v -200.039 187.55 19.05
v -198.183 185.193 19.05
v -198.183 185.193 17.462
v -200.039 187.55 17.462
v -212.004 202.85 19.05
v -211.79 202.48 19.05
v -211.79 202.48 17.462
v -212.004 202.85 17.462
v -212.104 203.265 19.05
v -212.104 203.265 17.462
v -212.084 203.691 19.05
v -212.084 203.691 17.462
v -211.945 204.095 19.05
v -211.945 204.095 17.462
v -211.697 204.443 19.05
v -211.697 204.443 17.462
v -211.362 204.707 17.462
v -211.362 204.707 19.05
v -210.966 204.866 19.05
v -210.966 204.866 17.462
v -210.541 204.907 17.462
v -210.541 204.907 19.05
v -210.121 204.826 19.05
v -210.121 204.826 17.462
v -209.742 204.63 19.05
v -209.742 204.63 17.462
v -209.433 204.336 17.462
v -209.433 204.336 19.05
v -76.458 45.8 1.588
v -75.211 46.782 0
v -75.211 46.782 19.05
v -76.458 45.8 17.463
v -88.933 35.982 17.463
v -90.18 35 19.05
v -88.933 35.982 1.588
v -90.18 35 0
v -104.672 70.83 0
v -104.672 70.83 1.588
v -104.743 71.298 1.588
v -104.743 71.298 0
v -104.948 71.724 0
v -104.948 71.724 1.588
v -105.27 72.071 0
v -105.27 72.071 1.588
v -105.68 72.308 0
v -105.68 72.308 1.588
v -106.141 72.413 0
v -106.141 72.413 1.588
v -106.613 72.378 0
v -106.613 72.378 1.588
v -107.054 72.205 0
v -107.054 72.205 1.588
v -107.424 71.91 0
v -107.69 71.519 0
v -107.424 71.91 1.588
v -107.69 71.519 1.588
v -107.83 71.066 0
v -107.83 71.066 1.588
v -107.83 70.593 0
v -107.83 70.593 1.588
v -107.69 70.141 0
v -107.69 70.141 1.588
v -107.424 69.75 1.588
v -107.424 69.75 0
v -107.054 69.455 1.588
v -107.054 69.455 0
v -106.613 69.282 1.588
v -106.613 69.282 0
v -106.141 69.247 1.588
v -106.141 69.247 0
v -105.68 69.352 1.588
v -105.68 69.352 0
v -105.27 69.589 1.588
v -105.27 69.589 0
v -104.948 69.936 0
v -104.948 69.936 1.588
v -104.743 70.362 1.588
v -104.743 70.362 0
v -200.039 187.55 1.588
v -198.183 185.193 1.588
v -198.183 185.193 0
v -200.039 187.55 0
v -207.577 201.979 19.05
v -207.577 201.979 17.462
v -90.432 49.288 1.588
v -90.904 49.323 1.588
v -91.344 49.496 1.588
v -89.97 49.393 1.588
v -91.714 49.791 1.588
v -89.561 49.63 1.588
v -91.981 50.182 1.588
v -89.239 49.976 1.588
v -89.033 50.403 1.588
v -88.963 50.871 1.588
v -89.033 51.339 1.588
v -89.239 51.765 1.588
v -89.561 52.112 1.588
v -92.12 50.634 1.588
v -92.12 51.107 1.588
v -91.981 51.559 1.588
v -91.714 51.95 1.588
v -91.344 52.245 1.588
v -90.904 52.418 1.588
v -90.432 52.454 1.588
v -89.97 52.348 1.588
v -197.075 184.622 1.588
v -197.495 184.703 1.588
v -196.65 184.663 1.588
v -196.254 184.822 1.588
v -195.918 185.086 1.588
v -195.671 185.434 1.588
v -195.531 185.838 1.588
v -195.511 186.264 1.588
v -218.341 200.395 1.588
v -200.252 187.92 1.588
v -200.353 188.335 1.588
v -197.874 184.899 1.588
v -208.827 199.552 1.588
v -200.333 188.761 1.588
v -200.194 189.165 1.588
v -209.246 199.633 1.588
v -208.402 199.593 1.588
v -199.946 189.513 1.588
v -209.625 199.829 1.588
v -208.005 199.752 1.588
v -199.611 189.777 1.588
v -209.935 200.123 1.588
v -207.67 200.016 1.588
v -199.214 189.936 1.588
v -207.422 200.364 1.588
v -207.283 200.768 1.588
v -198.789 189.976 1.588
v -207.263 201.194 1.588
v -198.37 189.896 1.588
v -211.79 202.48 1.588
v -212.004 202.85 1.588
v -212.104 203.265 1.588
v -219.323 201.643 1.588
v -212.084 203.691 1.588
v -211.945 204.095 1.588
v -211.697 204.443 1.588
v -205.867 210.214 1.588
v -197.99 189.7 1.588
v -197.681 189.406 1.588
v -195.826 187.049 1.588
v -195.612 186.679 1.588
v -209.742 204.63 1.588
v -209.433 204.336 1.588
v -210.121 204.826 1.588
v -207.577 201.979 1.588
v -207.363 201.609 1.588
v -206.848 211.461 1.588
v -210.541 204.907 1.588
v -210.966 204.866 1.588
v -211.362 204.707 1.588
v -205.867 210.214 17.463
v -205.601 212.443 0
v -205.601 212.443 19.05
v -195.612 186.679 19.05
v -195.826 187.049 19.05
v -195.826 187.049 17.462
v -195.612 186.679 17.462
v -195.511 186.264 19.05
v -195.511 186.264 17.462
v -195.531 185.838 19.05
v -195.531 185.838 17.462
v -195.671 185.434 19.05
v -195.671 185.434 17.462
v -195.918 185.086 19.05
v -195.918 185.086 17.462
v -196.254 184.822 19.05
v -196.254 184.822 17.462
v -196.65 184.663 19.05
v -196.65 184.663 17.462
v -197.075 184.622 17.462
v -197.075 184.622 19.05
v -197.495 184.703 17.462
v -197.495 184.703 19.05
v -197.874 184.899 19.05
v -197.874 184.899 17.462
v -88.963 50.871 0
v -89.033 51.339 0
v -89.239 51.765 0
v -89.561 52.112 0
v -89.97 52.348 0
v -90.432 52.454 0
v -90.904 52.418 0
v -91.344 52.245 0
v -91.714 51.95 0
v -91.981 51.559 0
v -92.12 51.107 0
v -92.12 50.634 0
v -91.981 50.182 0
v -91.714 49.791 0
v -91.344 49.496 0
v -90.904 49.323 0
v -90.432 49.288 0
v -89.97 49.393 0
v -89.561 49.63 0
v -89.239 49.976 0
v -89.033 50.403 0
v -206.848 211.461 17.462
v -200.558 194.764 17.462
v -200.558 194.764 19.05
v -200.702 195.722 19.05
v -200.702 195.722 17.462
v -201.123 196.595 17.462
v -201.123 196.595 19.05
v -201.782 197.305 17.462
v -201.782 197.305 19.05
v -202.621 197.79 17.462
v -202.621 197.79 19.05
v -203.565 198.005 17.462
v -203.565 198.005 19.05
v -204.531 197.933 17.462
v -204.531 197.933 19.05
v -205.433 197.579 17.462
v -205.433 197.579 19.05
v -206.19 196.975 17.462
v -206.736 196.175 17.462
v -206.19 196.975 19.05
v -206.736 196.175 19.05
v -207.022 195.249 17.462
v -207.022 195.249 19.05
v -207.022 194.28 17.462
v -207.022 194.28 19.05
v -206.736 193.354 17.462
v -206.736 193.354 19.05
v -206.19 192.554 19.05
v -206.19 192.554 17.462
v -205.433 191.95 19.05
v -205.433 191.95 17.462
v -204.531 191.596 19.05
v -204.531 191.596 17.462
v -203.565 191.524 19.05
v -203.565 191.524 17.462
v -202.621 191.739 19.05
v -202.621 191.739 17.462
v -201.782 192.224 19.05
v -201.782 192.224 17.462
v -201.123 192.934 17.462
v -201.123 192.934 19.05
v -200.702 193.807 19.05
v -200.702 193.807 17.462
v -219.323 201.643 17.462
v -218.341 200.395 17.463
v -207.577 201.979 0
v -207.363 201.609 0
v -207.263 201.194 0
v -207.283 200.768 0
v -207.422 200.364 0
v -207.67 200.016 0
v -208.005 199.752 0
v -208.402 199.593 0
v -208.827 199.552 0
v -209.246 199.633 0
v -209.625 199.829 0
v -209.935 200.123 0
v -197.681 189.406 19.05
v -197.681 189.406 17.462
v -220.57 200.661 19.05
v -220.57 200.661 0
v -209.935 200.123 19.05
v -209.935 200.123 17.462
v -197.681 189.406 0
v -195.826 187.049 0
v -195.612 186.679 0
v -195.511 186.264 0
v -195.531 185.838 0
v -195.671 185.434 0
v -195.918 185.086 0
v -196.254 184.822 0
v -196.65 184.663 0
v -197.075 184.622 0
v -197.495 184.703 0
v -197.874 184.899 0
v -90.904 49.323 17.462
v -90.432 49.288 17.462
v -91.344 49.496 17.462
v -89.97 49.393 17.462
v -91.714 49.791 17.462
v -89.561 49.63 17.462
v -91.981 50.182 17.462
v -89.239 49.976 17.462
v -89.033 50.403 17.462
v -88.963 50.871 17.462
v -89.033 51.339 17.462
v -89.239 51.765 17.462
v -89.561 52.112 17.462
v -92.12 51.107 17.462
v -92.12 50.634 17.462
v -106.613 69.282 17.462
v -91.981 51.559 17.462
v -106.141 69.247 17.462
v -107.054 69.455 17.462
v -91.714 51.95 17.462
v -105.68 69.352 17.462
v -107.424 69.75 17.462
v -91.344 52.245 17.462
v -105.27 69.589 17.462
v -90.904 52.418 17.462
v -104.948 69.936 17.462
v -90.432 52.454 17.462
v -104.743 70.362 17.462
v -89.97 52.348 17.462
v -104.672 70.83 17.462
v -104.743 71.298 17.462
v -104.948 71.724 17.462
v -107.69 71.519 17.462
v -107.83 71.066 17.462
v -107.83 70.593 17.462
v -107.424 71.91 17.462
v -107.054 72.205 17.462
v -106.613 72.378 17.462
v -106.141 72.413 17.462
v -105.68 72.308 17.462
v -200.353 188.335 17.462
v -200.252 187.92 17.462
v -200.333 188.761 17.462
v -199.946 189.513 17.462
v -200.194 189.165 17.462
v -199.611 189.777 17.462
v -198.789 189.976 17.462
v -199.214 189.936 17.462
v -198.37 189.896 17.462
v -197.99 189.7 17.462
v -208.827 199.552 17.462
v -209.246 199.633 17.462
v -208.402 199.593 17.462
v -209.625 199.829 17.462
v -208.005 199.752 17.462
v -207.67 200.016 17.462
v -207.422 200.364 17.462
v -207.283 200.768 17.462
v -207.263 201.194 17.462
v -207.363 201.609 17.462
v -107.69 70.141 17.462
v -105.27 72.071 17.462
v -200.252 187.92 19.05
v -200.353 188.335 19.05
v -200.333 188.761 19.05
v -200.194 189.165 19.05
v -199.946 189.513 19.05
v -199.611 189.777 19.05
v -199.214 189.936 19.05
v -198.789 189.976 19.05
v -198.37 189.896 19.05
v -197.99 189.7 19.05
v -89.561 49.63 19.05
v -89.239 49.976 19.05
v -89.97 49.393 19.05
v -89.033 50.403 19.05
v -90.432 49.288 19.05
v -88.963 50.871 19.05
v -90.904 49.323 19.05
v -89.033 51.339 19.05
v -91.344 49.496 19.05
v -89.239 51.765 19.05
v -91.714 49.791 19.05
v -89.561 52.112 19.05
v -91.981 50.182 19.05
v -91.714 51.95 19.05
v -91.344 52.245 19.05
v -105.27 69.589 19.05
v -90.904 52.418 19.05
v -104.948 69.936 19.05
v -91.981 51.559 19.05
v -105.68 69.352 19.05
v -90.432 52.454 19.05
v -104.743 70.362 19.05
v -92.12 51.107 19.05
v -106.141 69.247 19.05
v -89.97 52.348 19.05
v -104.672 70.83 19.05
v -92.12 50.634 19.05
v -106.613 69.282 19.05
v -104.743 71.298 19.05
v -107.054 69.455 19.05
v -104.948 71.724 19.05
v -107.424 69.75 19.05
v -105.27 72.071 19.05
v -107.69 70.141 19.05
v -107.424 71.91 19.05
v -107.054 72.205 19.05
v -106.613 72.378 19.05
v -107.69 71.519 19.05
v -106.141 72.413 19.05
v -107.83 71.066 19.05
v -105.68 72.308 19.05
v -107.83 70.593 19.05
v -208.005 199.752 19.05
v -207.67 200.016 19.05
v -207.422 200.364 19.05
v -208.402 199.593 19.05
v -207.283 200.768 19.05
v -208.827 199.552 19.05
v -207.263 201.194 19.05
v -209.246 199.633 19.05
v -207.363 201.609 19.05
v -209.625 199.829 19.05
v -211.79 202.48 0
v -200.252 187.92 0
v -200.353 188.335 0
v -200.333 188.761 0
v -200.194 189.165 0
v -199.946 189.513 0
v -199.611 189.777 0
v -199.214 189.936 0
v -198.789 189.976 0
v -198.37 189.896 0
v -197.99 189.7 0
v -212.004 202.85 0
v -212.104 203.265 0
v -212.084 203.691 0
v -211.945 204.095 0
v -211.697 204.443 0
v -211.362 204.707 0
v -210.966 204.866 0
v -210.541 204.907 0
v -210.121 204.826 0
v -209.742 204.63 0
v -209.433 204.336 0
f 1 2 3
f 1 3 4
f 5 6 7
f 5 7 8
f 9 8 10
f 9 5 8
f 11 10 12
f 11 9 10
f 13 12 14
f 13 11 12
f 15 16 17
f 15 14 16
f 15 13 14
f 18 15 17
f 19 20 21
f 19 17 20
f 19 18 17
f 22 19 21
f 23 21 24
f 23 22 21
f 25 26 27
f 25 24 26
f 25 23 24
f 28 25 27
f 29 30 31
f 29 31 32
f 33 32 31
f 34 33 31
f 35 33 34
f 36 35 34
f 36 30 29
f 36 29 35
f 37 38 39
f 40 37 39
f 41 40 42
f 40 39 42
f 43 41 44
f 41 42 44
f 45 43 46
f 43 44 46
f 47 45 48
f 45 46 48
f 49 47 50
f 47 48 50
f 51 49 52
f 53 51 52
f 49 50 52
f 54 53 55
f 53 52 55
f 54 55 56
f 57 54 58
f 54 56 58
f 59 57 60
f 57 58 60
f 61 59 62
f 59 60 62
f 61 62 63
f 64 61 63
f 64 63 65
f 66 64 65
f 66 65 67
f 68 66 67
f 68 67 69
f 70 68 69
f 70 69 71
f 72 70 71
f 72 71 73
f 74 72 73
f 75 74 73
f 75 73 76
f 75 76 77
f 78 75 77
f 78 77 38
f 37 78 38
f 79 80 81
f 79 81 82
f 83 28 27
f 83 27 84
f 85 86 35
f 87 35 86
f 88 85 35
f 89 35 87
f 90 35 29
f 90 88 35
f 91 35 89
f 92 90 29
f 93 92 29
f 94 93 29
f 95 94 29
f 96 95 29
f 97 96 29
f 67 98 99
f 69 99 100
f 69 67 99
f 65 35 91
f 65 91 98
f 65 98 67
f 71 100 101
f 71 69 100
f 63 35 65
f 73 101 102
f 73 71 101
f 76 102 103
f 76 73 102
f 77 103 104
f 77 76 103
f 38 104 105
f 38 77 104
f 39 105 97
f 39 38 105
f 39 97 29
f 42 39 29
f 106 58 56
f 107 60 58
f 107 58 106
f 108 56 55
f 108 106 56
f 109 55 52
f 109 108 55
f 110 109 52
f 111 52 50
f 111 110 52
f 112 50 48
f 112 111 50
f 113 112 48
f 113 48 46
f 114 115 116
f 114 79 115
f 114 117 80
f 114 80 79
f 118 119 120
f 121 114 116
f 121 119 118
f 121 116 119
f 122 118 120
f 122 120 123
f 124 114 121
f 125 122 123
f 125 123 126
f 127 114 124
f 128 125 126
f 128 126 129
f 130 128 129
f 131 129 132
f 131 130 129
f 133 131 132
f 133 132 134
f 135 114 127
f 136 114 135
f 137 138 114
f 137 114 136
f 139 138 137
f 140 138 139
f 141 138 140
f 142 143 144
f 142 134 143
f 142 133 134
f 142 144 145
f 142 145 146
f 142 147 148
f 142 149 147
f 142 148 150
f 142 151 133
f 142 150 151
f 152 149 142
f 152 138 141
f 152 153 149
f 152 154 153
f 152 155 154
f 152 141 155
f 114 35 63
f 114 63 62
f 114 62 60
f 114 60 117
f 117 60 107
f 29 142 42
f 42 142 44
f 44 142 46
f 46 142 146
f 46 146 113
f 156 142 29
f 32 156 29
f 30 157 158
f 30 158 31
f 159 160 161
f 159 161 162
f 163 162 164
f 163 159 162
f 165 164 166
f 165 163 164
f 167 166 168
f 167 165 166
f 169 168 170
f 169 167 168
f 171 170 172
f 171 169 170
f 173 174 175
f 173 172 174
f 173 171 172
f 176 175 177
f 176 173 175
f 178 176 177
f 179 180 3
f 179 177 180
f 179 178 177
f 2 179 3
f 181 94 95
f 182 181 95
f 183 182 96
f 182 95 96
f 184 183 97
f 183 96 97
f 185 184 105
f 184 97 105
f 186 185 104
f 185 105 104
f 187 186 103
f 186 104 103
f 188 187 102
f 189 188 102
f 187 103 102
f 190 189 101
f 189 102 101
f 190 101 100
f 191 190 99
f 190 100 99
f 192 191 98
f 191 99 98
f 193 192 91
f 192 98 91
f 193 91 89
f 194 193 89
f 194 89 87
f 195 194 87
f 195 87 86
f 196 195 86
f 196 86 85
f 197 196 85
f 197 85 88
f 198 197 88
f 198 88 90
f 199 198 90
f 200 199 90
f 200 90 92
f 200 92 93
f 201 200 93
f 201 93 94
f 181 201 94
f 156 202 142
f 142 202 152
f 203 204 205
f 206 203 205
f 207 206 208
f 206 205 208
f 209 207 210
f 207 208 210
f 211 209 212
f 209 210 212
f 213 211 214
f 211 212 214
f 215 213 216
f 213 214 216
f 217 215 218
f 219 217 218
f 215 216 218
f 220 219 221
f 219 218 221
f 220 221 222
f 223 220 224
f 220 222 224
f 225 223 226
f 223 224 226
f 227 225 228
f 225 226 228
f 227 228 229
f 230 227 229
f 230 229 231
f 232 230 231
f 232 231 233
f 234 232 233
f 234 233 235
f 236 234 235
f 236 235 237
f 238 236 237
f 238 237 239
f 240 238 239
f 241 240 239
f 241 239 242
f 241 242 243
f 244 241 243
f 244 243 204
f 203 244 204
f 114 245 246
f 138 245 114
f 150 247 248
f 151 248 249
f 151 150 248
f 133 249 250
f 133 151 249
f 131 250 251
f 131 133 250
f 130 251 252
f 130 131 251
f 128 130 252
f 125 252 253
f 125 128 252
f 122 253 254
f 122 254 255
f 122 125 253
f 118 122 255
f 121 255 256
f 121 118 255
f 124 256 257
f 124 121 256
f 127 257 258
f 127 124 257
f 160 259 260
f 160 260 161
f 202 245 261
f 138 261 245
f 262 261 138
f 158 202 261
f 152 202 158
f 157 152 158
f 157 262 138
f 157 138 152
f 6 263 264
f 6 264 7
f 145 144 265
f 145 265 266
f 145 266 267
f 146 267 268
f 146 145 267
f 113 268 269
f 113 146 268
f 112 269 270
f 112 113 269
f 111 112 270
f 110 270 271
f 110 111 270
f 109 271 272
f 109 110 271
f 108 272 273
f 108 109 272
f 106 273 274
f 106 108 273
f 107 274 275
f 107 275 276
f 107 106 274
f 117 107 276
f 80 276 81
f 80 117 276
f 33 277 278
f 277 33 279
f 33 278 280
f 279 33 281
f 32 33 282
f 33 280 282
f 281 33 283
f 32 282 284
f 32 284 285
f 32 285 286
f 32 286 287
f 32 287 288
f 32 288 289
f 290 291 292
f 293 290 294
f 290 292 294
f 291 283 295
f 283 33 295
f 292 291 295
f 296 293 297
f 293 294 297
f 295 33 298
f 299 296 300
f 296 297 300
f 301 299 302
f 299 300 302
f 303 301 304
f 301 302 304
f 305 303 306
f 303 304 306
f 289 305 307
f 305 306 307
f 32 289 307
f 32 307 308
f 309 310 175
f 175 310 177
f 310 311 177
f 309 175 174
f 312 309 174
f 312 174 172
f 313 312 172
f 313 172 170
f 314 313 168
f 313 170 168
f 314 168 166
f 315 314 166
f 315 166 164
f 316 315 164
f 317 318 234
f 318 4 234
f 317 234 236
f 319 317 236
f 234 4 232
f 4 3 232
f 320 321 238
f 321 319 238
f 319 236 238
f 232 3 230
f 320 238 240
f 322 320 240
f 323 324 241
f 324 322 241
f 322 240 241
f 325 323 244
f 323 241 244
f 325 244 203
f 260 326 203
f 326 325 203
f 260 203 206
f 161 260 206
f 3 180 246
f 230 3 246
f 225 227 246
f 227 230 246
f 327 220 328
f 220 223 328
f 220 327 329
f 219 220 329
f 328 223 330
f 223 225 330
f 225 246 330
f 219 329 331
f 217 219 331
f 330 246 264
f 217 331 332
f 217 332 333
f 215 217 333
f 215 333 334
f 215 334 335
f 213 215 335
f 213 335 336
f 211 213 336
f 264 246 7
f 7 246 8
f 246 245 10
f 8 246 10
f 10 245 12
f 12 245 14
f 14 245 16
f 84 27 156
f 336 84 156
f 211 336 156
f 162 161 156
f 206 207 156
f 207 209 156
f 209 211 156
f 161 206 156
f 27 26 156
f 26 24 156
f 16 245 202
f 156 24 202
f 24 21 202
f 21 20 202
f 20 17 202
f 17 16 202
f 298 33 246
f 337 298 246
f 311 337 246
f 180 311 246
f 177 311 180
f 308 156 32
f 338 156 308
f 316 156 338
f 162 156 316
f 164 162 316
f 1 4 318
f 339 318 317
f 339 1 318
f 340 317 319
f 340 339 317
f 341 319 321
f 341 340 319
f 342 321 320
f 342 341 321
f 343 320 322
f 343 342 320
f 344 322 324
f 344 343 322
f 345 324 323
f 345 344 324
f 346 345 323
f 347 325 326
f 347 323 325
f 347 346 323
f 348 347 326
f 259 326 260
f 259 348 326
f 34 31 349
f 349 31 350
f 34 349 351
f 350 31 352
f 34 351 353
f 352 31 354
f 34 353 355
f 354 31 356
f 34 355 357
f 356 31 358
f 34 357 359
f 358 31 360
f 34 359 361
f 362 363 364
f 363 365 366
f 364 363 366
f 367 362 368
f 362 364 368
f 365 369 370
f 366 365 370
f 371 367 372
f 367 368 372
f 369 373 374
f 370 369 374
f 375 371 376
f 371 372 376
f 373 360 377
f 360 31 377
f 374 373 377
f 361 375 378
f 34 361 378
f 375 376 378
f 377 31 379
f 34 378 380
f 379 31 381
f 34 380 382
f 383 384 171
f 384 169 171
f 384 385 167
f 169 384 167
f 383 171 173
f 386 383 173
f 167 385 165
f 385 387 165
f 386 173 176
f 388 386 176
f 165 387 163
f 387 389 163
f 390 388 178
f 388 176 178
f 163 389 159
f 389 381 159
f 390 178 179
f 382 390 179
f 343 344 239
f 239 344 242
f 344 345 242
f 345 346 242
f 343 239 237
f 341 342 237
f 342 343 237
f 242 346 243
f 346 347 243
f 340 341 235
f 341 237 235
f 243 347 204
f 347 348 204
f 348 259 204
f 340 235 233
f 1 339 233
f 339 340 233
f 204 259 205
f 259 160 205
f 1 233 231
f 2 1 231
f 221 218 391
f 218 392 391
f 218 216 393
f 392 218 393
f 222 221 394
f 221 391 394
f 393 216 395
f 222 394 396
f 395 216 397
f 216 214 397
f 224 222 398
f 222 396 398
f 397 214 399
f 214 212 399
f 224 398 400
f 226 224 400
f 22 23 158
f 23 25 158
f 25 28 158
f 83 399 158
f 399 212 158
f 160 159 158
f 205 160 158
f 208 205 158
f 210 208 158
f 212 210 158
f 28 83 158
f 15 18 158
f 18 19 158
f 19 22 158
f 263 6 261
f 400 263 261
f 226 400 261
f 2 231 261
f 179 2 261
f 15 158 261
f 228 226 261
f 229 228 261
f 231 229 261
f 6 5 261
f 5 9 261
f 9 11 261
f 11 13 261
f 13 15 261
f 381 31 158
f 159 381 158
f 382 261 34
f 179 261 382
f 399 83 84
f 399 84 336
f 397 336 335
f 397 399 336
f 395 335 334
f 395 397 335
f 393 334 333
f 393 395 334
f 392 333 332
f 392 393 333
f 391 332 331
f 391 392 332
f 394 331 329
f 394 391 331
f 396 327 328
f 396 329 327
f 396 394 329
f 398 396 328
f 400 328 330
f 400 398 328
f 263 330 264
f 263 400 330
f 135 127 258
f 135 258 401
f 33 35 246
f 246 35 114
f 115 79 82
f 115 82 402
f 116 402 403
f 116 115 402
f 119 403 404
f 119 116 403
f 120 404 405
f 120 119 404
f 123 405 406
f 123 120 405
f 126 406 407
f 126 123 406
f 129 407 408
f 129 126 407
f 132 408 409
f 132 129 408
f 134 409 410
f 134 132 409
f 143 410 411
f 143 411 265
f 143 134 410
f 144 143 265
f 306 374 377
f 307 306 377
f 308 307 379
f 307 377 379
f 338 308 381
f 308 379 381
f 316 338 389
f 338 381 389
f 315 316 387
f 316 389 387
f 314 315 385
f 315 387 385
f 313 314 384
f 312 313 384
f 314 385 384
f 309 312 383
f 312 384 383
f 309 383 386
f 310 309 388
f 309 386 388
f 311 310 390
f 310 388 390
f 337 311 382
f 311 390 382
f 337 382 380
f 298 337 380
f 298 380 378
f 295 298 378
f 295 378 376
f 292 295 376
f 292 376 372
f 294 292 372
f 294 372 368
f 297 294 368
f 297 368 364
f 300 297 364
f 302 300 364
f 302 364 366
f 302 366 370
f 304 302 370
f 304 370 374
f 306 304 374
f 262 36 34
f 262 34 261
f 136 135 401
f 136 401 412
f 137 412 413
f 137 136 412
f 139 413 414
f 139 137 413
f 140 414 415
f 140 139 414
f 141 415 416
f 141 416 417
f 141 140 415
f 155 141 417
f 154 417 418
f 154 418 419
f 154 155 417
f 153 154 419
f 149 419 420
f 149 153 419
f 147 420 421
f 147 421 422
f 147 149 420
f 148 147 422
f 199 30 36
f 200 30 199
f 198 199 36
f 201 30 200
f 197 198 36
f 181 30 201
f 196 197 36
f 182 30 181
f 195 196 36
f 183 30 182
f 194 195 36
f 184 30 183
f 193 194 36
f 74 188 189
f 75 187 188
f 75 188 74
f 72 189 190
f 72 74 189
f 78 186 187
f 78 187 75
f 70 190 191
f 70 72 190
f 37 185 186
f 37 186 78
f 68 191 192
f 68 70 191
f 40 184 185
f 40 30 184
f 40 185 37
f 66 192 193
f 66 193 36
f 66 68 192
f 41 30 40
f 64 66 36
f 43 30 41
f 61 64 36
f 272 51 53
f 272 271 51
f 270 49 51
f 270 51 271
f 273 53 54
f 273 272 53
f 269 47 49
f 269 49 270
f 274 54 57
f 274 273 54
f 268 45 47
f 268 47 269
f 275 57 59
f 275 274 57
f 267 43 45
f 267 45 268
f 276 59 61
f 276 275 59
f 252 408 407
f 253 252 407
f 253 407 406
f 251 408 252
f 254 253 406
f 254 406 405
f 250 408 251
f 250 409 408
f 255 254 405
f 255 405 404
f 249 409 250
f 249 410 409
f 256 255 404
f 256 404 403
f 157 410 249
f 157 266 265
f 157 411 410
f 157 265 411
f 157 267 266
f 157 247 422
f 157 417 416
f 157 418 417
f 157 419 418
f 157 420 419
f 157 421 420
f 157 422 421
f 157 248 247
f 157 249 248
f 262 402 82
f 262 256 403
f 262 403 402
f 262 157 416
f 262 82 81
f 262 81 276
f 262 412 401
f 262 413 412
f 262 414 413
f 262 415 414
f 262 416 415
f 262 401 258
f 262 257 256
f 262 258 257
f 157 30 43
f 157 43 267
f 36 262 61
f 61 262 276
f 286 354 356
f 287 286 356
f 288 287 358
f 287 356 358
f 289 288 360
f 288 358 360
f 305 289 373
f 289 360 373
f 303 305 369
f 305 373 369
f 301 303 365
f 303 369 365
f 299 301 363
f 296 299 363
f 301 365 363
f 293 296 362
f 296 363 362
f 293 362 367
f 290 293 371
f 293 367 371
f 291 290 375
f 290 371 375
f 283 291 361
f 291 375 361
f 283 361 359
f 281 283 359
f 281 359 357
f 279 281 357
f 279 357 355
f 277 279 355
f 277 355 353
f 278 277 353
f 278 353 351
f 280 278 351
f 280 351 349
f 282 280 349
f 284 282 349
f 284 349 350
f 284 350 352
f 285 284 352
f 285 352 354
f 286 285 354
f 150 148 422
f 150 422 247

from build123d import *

# Parameters (mm, degrees)
BOSS_EXTRUDE1_DEPTH = 19.05
SHELL1_T            = -1.5875
SKETCH2_W           = 15.875
SKETCH2_H           = 15.875
CUT_EXTRUDE1_DEPTH  = 221.078395706
SKETCH3_R           = 3.25
CUT_EXTRUDE2_DEPTH  = 2.54
SKETCH7_R           = 1.5875
CUT_EXTRUDE3_DEPTH  = 20.05
CUT_EXTRUDE4_DEPTH  = 19.05


with BuildPart() as part:
    # Sketch1 → Boss-Extrude1 (new body)
    with BuildSketch(Plane.XY):
        Polygon((-220.570309856, 200.660746496), (-205.600965293, 212.442988361), (-75.21082199, 46.782241865), (-90.180166553, 35), align=None)
    extrude(amount=BOSS_EXTRUDE1_DEPTH)

    # Shell1
    shell1_openings = [part.faces().sort_by_distance(p)[0] for p in [
        (-82.695494272, 40.891120932, 9.525),
    ]]
    offset(amount=SHELL1_T, openings=shell1_openings, kind=Kind.INTERSECTION)

    # Sketch2 → Cut-Extrude1 (cut, through all)
    with BuildSketch(Plane(origin=(-181.896970564, 231.100197958, 0), x_dir=(0.785792366, 0.618490387, 0), z_dir=(-0.618490387, 0.785792366, 0))):
        with Locations((-39.690722867, -9.525)):
            Rectangle(SKETCH2_W, SKETCH2_H)
    extrude(amount=-CUT_EXTRUDE1_DEPTH, mode=Mode.SUBTRACT)

    # Sketch3 → Cut-Extrude2 (cut)
    with BuildSketch(Plane.XY.offset(19.05)):
        with Locations((-203.807891879, 194.764486582)):
            Circle(SKETCH3_R)
    extrude(amount=-CUT_EXTRUDE2_DEPTH, mode=Mode.SUBTRACT)

    # Sketch7 → Cut-Extrude3 (cut, through all)
    with BuildSketch(Plane.XY.offset(19.05)):
        with Locations((-106.259978001, 70.829810058)):
            Circle(SKETCH7_R)
        with Locations((-90.550322182, 50.870683974)):
            Circle(SKETCH7_R)
    extrude(amount=-CUT_EXTRUDE3_DEPTH, mode=Mode.SUBTRACT)

    # Sketch9 → Cut-Extrude4 (cut)
    with BuildSketch(Plane.XY.offset(19.05)):
        with BuildLine():
            Line((-197.681280238, 189.405883238), (-195.825809078, 187.048506142))
            ThreePointArc((-195.825809078, 187.048506142), (-196.076762046, 184.942082013), (-198.183186175, 185.193034982))
            Line((-198.183186175, 185.193034982), (-200.038657334, 187.550412078))
            ThreePointArc((-200.038657334, 187.550412078), (-199.787704366, 189.656836206), (-197.681280238, 189.405883238))
        make_face()
        with BuildLine():
            Line((-209.432597583, 204.335938183), (-207.577126423, 201.978561086))
            ThreePointArc((-207.577126423, 201.978561086), (-207.828079392, 199.872136958), (-209.93450352, 200.123089926))
            Line((-209.93450352, 200.123089926), (-211.78997468, 202.480467023))
            ThreePointArc((-211.78997468, 202.480467023), (-211.539021711, 204.586891151), (-209.432597583, 204.335938183))
        make_face()
    extrude(amount=-CUT_EXTRUDE4_DEPTH, mode=Mode.SUBTRACT)


solid = part.part
